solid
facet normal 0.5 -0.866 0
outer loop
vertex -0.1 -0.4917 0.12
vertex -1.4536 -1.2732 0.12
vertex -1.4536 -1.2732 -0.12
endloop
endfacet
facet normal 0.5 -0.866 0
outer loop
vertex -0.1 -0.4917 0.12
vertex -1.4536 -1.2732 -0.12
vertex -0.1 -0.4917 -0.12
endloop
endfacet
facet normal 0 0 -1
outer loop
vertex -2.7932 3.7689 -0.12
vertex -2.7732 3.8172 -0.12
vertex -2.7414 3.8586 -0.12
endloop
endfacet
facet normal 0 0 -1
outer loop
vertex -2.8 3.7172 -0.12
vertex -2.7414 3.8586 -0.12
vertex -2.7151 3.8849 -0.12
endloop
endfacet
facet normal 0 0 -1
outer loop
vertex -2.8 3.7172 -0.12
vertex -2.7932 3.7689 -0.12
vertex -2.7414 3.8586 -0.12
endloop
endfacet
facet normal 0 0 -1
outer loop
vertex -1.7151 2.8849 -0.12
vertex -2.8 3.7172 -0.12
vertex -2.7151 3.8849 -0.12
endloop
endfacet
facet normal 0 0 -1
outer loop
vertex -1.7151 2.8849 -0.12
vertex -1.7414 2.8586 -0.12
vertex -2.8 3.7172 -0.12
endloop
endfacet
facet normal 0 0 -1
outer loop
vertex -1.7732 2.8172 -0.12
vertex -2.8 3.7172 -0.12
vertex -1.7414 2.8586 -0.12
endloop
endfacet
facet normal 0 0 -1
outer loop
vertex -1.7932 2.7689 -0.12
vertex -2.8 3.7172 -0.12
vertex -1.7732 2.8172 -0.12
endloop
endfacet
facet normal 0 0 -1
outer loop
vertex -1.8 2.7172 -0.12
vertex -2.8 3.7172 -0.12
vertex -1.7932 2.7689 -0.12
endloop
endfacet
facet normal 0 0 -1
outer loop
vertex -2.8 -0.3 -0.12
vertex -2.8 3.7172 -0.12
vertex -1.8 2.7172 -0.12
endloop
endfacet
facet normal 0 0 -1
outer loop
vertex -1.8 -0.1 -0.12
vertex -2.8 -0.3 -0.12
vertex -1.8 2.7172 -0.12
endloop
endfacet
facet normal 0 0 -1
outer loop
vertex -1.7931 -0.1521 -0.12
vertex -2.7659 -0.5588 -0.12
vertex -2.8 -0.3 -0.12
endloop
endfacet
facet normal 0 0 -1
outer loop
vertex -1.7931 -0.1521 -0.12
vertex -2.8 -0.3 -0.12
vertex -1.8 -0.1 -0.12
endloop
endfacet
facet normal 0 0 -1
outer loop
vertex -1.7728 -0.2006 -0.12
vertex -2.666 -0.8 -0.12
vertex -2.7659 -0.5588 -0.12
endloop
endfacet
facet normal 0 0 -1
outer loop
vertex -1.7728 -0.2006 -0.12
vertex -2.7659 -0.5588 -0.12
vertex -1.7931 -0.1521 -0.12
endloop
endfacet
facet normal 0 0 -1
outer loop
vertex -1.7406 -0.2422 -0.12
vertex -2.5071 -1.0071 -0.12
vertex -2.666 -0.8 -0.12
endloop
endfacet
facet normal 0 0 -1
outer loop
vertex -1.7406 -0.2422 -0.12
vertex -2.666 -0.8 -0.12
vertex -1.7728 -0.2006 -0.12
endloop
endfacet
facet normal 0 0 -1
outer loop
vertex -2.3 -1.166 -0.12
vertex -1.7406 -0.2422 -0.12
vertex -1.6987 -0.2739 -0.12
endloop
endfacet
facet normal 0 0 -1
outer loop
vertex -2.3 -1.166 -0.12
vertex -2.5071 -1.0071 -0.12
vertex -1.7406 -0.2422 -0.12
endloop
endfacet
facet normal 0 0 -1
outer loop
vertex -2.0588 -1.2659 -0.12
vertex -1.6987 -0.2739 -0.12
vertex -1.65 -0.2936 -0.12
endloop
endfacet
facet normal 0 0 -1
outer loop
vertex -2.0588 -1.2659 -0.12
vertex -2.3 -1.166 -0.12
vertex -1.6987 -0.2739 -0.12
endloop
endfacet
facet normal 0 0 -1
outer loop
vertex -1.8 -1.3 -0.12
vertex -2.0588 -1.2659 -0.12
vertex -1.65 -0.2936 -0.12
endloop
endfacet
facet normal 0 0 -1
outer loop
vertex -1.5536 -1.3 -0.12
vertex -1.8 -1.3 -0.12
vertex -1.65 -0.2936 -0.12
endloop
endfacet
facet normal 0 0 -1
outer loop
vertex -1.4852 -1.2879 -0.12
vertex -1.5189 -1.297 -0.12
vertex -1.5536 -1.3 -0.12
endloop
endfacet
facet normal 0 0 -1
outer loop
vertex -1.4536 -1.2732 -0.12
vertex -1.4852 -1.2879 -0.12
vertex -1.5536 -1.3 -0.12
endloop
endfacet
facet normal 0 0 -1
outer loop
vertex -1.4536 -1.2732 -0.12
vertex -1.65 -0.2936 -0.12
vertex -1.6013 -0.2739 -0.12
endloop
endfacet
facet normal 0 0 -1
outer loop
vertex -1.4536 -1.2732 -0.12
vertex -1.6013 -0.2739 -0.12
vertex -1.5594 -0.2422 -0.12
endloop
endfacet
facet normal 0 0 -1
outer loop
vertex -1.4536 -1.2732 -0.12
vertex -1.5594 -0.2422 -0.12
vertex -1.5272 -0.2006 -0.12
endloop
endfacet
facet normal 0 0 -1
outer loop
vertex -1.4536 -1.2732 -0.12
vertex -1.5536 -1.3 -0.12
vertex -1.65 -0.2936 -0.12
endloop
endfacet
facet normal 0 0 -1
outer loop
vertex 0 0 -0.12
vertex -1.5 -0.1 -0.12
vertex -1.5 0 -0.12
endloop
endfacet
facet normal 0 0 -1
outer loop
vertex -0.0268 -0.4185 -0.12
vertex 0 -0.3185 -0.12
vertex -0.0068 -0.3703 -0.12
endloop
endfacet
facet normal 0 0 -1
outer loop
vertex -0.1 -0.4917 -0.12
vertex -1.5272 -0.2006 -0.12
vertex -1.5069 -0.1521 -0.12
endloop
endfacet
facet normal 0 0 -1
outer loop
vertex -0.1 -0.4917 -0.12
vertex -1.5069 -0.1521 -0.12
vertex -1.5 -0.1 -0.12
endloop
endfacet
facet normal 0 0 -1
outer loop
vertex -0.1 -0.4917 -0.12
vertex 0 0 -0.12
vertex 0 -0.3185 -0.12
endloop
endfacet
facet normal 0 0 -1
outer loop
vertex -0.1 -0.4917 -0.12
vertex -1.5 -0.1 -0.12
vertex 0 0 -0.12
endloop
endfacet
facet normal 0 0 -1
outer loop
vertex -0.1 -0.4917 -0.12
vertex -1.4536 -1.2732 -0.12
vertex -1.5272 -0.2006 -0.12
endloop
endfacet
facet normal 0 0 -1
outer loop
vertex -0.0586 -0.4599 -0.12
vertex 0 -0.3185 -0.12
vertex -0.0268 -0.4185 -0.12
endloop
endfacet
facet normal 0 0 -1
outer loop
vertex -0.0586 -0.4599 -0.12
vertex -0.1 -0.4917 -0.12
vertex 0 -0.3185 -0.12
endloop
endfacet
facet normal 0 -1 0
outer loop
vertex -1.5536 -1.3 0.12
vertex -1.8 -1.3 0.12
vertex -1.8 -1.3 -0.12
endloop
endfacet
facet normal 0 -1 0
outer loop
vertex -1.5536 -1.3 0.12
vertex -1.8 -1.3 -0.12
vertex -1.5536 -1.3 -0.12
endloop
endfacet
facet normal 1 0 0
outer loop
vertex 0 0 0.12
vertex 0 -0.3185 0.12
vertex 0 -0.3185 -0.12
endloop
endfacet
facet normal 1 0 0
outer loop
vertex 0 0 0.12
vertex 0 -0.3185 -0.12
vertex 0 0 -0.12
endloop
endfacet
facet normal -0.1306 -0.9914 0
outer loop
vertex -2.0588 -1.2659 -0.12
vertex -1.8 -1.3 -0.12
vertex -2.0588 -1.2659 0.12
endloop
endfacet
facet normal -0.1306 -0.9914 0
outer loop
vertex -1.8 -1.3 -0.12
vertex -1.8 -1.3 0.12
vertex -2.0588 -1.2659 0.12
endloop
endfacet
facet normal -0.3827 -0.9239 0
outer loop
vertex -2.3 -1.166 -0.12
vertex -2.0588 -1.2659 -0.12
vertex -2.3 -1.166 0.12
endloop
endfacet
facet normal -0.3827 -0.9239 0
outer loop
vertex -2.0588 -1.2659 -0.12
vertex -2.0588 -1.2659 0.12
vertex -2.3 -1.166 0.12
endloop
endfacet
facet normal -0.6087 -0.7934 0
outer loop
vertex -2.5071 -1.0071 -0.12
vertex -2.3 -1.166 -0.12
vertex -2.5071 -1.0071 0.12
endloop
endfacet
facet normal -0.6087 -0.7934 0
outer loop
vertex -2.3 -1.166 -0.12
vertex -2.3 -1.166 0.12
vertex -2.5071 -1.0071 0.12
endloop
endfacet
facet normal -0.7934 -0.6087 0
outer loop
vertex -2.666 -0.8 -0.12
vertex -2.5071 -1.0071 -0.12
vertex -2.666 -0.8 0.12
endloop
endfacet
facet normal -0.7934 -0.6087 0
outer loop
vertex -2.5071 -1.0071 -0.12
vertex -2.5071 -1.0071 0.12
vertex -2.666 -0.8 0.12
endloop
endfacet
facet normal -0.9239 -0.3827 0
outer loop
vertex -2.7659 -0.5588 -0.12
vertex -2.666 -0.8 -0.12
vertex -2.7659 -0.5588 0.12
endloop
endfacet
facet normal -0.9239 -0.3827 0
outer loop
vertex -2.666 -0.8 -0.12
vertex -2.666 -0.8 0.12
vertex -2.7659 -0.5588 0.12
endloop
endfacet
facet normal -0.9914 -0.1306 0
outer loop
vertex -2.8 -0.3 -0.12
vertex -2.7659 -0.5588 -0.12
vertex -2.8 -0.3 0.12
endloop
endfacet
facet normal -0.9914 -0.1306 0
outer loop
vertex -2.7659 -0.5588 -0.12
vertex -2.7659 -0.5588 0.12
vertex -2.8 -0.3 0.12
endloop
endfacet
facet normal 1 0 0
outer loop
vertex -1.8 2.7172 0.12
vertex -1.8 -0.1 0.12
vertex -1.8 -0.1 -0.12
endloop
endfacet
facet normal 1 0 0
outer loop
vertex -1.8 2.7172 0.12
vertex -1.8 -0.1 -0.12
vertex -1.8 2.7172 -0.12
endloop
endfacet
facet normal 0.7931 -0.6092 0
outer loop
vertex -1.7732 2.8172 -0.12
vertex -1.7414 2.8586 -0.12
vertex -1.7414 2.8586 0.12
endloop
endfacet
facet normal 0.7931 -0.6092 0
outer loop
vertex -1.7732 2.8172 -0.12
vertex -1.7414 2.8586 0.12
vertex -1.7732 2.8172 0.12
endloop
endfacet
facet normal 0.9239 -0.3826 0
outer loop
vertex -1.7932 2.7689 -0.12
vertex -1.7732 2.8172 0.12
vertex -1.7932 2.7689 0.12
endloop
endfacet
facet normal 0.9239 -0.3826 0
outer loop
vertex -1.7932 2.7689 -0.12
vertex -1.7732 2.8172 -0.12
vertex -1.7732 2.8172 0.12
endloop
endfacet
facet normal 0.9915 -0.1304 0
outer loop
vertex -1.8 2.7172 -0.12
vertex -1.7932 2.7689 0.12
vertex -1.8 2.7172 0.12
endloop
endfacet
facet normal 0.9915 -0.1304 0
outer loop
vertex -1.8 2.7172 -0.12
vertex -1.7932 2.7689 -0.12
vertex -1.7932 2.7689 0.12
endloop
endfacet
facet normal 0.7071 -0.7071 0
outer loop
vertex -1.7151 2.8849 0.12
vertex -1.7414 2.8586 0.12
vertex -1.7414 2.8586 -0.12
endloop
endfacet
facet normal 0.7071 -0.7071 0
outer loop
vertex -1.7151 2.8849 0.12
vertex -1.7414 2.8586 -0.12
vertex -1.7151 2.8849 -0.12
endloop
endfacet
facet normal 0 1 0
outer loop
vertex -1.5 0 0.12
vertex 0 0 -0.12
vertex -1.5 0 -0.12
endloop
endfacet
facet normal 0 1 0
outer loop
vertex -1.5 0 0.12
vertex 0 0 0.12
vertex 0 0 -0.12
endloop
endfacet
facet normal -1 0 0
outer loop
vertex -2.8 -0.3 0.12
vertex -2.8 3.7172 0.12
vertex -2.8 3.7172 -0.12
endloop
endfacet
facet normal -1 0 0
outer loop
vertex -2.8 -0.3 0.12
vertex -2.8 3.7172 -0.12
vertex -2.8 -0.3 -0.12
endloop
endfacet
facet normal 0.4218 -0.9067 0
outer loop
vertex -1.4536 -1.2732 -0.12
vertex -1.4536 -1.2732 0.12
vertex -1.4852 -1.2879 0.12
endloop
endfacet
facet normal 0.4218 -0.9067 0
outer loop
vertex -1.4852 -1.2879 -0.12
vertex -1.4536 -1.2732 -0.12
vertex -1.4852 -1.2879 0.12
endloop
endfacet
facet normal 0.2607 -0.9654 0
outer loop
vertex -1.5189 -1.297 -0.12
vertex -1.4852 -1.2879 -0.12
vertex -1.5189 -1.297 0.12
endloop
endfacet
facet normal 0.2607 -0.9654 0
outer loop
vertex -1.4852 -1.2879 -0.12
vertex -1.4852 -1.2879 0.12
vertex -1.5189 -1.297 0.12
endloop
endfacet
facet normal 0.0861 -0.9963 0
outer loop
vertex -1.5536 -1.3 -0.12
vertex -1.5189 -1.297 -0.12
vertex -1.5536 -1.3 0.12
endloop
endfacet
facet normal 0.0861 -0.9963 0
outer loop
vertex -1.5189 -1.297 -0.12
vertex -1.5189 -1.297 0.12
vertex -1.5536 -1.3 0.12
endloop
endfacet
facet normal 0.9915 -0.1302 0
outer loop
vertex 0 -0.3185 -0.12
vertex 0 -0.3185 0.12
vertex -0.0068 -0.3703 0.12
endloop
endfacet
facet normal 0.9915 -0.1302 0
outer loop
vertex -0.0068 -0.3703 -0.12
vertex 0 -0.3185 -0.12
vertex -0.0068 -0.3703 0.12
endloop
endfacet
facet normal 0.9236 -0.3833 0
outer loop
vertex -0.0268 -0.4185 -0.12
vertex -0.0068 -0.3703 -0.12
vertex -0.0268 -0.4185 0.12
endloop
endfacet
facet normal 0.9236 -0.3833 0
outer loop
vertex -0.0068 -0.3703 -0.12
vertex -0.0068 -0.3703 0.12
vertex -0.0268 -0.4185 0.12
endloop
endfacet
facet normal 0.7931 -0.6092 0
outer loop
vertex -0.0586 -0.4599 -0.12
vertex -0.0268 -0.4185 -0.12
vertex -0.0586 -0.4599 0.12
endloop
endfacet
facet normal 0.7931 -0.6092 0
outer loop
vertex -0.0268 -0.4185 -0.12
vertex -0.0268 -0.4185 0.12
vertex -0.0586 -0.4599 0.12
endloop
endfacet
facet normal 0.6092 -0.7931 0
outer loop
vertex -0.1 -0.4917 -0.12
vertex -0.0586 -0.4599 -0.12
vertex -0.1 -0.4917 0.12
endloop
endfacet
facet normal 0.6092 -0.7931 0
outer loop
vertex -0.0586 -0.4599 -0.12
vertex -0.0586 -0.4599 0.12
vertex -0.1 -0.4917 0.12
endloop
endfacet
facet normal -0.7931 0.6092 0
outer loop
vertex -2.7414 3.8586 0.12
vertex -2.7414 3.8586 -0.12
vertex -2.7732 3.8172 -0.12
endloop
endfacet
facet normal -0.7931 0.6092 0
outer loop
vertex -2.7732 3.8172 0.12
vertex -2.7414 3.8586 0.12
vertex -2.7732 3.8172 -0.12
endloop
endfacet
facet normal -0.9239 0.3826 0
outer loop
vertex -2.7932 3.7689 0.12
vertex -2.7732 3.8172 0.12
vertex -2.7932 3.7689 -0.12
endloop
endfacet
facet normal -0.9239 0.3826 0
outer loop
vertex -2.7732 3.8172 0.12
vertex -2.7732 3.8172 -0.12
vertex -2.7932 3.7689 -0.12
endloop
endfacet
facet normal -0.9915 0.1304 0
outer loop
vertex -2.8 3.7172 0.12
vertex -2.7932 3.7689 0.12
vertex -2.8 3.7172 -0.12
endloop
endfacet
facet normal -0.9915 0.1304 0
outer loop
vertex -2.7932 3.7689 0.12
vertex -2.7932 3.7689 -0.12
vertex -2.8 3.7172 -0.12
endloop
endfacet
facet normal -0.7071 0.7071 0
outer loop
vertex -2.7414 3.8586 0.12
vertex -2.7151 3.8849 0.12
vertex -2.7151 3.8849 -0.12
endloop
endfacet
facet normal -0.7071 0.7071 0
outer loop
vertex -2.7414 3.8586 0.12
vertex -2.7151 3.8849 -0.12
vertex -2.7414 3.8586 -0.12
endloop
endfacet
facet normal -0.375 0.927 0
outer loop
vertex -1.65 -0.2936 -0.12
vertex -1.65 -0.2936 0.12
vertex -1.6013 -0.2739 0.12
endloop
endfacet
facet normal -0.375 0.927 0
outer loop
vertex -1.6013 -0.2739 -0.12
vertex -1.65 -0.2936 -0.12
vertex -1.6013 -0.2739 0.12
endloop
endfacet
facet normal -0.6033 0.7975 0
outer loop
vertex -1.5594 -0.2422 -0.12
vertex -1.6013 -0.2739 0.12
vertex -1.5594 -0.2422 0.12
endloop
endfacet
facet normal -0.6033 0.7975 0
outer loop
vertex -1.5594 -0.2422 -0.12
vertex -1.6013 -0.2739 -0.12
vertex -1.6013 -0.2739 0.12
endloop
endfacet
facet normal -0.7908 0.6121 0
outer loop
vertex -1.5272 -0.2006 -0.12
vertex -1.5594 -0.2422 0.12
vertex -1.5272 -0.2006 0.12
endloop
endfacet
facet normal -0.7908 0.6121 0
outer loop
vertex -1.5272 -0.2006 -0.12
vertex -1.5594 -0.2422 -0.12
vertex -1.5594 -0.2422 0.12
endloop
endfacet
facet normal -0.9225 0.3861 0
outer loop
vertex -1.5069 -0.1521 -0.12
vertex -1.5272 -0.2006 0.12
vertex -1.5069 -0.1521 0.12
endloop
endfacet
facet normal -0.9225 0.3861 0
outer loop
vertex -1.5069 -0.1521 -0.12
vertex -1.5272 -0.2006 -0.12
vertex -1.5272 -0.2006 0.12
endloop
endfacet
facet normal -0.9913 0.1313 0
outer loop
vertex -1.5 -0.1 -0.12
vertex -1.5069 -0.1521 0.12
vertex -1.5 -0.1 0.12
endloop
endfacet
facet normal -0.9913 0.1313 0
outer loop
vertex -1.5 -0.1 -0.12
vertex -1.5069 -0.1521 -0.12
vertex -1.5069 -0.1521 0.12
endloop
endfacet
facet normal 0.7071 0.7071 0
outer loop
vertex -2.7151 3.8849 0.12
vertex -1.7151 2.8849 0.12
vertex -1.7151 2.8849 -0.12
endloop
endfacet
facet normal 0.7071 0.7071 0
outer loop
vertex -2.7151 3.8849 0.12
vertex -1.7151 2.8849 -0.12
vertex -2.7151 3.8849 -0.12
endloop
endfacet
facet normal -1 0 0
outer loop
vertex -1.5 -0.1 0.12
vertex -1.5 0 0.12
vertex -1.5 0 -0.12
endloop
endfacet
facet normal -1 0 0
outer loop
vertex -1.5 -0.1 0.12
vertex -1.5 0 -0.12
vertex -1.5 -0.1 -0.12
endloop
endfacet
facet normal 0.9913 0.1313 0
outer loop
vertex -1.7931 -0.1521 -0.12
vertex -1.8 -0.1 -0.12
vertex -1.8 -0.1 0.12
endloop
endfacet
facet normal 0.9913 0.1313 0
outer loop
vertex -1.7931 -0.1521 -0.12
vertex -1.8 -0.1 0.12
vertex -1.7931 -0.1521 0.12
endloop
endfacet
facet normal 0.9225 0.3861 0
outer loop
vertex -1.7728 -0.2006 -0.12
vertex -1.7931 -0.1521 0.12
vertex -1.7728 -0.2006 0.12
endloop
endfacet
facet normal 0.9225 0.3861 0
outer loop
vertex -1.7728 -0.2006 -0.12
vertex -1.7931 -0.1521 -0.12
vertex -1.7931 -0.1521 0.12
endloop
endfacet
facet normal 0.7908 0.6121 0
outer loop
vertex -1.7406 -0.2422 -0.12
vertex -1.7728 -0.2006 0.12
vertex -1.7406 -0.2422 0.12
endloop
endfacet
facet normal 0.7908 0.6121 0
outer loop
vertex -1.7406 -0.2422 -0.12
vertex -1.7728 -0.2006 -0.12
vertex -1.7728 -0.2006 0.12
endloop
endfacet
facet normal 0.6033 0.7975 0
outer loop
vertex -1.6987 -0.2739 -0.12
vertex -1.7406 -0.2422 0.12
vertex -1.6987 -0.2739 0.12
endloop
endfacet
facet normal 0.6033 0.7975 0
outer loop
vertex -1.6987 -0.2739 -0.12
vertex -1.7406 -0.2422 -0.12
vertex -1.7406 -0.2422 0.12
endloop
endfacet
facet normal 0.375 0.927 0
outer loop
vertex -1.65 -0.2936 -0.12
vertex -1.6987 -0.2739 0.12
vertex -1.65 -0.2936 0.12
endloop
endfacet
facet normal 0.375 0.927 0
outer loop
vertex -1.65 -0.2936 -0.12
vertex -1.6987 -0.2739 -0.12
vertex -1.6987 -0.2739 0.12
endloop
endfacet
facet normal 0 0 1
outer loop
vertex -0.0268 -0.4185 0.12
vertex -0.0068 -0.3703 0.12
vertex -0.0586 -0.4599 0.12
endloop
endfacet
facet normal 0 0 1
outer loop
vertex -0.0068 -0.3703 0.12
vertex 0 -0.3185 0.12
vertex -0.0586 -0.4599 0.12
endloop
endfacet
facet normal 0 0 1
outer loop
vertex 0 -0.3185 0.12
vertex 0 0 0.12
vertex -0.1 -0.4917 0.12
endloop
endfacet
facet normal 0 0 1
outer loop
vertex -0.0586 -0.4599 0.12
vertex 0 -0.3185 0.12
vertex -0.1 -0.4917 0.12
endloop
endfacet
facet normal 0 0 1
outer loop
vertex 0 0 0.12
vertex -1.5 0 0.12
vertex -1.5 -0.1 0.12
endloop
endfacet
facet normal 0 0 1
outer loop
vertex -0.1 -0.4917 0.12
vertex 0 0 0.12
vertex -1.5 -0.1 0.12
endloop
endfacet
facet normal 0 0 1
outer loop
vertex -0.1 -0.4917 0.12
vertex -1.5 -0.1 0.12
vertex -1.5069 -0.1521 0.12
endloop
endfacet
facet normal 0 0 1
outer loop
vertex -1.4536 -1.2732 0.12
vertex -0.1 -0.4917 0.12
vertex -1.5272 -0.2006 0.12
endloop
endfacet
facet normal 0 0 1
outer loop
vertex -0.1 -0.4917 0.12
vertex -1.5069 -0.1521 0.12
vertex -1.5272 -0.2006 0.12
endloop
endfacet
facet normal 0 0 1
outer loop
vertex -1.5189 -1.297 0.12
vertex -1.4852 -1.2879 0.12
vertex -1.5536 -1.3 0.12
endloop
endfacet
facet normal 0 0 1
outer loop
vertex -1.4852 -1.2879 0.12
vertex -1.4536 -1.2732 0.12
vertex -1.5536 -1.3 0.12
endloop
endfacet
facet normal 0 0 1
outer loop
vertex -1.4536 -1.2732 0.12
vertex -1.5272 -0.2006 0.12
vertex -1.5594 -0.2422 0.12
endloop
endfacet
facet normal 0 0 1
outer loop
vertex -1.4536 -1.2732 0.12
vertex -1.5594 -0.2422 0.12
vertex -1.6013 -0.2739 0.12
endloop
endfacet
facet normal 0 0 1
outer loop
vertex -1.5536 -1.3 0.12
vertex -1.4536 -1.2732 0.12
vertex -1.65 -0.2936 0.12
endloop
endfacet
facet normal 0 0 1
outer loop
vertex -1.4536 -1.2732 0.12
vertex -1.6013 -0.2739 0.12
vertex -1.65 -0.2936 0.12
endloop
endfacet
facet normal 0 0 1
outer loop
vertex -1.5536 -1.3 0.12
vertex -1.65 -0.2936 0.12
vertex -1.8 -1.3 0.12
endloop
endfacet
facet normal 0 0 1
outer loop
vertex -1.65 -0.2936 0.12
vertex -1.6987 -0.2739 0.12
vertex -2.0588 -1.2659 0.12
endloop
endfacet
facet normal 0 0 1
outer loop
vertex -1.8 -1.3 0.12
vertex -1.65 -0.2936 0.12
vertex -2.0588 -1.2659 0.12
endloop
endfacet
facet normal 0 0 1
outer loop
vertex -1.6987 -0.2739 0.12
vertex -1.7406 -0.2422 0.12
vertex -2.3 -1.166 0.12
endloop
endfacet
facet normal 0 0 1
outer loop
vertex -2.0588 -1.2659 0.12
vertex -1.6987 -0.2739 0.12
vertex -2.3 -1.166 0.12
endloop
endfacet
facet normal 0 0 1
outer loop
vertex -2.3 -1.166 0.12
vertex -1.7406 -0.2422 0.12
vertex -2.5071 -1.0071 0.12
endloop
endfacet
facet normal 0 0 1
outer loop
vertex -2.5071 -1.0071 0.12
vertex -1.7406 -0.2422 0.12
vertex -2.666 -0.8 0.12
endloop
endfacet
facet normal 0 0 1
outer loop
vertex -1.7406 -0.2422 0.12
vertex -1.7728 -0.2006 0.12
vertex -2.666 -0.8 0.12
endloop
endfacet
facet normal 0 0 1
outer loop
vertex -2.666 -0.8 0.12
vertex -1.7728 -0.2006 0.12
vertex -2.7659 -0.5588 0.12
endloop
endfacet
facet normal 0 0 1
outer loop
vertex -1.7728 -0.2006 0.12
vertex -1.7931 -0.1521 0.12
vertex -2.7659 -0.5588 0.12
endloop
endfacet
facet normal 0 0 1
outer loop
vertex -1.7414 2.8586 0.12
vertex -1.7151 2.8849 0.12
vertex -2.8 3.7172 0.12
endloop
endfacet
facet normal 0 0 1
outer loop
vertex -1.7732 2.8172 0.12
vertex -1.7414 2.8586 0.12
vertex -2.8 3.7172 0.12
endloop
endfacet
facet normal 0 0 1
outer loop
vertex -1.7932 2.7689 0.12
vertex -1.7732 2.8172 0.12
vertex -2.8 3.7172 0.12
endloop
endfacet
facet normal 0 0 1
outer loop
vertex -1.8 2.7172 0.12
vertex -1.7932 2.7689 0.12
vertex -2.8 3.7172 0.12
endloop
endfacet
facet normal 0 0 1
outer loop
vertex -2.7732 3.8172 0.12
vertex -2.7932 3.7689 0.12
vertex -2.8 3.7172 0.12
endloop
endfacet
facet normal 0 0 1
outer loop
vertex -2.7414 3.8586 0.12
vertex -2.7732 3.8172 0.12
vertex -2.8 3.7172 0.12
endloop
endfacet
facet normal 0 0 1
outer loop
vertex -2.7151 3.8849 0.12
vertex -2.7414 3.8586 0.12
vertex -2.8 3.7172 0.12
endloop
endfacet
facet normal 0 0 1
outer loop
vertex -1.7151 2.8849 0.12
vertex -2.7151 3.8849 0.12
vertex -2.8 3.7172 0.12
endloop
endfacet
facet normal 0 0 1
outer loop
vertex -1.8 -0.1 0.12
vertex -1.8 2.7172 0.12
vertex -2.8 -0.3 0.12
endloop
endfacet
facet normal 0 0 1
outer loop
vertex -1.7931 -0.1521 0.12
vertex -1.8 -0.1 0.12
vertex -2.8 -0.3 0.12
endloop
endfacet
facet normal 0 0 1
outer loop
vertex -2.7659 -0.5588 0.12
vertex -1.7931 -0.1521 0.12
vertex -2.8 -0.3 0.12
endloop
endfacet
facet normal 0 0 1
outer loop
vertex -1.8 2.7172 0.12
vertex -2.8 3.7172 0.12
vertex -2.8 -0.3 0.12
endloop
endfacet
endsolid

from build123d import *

# Parameters (mm, degrees)
BOSS_EXTRUDE1_DEPTH = 0.12
FILLET1_R           = 1
FILLET2_R           = 0.2


with BuildPart() as part:
    # Sketch1 → Boss-Extrude1 (new, symmetric)
    with BuildSketch(Plane.XY):
        Polygon((0, 0), (-1.5, 0), (-1.5, -0.3), (-1.8, -0.3), (-1.8, 2.8), (-1.715147186, 2.884852814), (-2.715147186, 3.884852814), (-2.8, 3.8), (-2.8, -1.3), (-1.5, -1.3), (0, -0.433974596), align=None)
    extrude(amount=BOSS_EXTRUDE1_DEPTH, both=True)

    # Fillet1
    fillet1_edges = [part.edges().sort_by_distance(p)[0] for p in [
        (-2.8, -1.3, 0),
    ]]
    fillet(fillet1_edges, radius=FILLET1_R)

    # Fillet2
    # the kernel refuses this fillet: 0.2 mm, written as the material it adds along each edge
    with BuildSketch(Plane(origin=(-1.8, 2.8, -0.12), x_dir=(0.7071067811865476, 0.7071067811865476, 0), z_dir=(0, 0, 1))) as fillet2_piece_1:
        with BuildLine():
            CenterArc((FILLET2_R * 0.414213562373, -FILLET2_R), FILLET2_R, 90, 45)
            Line((-FILLET2_R * 0.292893218813, -FILLET2_R * 0.292893218813), (0, 0))
            Line((0, 0), (FILLET2_R * 0.414213562373, 0))
        make_face()
    extrude(amount=0.24)
    with BuildSketch(Plane(origin=(-1.5, -0.3, -0.12), x_dir=(-1, 0, 0), z_dir=(0, 0, 1)), Plane(origin=(-1.8, -0.3, -0.12), x_dir=(0, 1, 0), z_dir=(0, 0, 1))) as fillet2_piece_2:
        with BuildLine():
            CenterArc((FILLET2_R, -FILLET2_R), FILLET2_R, 90, 90)
            Line((0, -FILLET2_R), (0, 0))
            Line((0, 0), (FILLET2_R, 0))
        make_face()
    extrude(amount=0.24)
    # the kernel refuses this fillet: 0.2 mm, written as the material it takes off along each edge
    with BuildSketch(Plane(origin=(-2.8, 3.8, -0.327106781), x_dir=(0, -1, 0), z_dir=(0, 0, 1))) as fillet2_2_piece_1:
        with BuildLine():
            CenterArc((FILLET2_R * 0.414213562373, FILLET2_R), FILLET2_R, 225, 45)
            Line((-FILLET2_R * 0.292893218813, FILLET2_R * 0.292893218813), (0, 0))
            Line((0, 0), (FILLET2_R * 0.414213562373, 0))
        make_face()
    extrude(amount=0.654213562, mode=Mode.SUBTRACT)
    with BuildSketch(Plane(origin=(-1.5, -1.3, 0.253974596), x_dir=(-1, 0, 0), z_dir=(0, 0, -1))) as fillet2_2_piece_2:
        with BuildLine():
            CenterArc((FILLET2_R * 0.267949192431, FILLET2_R), FILLET2_R, 240, 30)
            Line((-FILLET2_R * 0.232050807569, FILLET2_R * 0.133974596216), (0, 0))
            Line((0, 0), (FILLET2_R * 0.267949192431, 0))
        make_face()
    extrude(amount=0.507949192, mode=Mode.SUBTRACT)
    with BuildSketch(Plane(origin=(0, -0.433974596, 0.408675135), x_dir=(-0.8660254037844399, -0.4999999999999978, 0), z_dir=(0, 0, -1))) as fillet2_2_piece_3:
        with BuildLine():
            CenterArc((FILLET2_R * 0.57735026919, FILLET2_R), FILLET2_R, 210, 60)
            Line((-FILLET2_R * 0.288675134595, FILLET2_R * 0.5), (0, 0))
            Line((0, 0), (FILLET2_R * 0.57735026919, 0))
        make_face()
    extrude(amount=0.817350269, mode=Mode.SUBTRACT)


solid = part.part
